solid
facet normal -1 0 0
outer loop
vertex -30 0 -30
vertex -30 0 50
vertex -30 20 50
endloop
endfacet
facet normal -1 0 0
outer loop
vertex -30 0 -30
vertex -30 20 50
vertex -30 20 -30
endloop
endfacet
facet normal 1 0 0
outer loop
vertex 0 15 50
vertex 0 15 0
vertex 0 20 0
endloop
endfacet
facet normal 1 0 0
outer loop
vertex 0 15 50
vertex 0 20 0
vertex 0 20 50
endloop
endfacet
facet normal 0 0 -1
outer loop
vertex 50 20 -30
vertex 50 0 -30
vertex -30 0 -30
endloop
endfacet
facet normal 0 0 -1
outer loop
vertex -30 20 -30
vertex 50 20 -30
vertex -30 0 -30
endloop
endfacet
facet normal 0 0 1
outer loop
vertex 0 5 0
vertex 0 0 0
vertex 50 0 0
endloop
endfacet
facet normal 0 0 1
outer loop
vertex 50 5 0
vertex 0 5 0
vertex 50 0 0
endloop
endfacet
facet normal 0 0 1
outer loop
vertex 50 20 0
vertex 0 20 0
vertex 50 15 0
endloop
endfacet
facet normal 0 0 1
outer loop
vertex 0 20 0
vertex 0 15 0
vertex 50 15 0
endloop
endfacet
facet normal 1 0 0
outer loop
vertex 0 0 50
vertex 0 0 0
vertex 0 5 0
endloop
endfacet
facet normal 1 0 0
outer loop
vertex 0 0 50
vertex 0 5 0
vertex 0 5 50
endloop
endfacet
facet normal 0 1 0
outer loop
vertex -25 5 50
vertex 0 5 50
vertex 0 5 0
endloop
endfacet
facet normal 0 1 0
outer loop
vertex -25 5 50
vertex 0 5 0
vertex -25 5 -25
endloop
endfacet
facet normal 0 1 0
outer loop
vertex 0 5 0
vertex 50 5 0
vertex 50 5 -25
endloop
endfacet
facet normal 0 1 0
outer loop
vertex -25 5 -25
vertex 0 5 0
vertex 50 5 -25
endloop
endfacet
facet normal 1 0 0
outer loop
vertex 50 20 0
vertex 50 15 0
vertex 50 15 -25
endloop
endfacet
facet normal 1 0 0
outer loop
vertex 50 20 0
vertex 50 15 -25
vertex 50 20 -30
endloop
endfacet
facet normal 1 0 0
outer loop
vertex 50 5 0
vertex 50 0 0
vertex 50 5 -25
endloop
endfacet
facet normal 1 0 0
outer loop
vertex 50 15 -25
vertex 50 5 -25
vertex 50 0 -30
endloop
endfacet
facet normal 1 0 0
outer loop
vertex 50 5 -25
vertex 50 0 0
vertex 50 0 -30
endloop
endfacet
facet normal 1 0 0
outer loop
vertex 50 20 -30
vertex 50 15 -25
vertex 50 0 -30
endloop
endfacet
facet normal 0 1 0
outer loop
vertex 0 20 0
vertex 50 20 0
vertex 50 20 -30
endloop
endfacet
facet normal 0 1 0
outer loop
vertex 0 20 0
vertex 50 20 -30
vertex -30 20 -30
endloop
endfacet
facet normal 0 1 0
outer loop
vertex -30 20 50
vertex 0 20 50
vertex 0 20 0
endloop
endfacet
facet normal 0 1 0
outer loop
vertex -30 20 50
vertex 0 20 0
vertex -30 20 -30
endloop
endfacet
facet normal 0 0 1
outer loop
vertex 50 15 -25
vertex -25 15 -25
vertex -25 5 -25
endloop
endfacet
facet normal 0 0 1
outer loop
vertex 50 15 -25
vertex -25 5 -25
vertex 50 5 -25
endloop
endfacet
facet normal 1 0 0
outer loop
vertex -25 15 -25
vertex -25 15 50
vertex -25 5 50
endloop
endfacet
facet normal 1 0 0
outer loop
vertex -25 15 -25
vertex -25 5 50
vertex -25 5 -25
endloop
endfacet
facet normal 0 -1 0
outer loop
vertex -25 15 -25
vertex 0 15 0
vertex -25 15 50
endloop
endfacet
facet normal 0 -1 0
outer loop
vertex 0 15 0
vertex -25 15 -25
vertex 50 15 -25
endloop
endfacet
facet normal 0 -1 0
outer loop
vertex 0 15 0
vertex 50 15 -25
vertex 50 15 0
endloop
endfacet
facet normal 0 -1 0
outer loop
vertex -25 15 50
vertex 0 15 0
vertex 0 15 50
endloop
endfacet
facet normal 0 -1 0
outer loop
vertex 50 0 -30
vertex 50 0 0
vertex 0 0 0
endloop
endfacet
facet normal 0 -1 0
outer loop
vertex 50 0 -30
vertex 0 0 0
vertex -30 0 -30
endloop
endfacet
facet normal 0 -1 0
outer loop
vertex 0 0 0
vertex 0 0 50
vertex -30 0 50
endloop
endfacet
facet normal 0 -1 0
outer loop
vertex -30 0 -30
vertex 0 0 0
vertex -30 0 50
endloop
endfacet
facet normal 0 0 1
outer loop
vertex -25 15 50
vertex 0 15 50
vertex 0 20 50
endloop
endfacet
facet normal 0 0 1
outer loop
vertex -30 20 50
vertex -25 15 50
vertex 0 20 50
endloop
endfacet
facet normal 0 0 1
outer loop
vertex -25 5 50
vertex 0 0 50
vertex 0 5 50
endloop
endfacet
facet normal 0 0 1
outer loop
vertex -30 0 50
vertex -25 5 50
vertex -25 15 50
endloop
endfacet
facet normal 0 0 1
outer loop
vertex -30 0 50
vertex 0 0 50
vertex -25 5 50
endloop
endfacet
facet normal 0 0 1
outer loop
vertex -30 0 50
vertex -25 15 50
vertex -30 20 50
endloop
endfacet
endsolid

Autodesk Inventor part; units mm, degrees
ref_plane "YZ Plane" through (0, 0, 0) normal (1, 0, 0) x (0, 1, 0)
ref_plane "XZ Plane" through (0, 0, 0) normal (0, 1, 0) x (-1, 0, 0)
ref_plane "XY Plane" through (0, 0, 0) normal (0, 0, 1) x (1, 0, 0)
sketch "Sketch2" plane through (0, 0, 0) normal (0, 1, 0) x (-1, 0, 0)
  line L0 (0, 0) -> (0, 50)
  line L1 (0, 50) -> (30, 50)
  line L2 (30, 50) -> (30, 0)
  line L3 (0, 0) -> (-50, 0)
  line L4 (0, 0) -> (50, 0) construction
  line L5 (-50, 0) -> (-50, -30)
  line L6 (-50, -30) -> (30, -30)
  line L7 (30, -30) -> (30, 0)
  dimension "d7" = 50
  dimension "d8" = 30
  dimension "d9" = 90
  dimension "d10" = 50
  dimension "d11" = 90
  dimension "d12" = 50
  dimension "d13" = 180
  dimension "d14" = 30
  dimension "d15" = 90
extrude "Extrusion1" add sketch "Sketch2" along normal blind 20
sketch "Sketch3" plane through (0, 0, 50) normal (1, 0, 0) x (0, 0, -1)
  line L0 (0, 5) -> (75, 5)
  line L1 (75, 5) -> (75, 15)
  line L2 (75, 15) -> (0, 15)
  line L3 (0, 15) -> (0, 5)
  point P0 (50, 0)
  dimension "d18" = 10
extrude "Extrusion2" cut sketch "Sketch3" against normal blind 25
sketch "Sketch4" plane through (0, 0, 0) normal (0, 0, 1) x (1, 0, 0)
  line L0 (0, 15) -> (-25, 15) projected
  line L1 (-25, 15) -> (75, 15)
  line L2 (75, 15) -> (75, 5)
  line L3 (75, 5) -> (-25, 5)
  line L4 (-25, 5) -> (-25, 15)
  point P0 (0, 0)
  dimension "d21" = 100
  dimension "d22" = 10
extrude "Extrusion3" cut sketch "Sketch4" against normal blind 25
properties part number "TSU_Corner_Clamp"
